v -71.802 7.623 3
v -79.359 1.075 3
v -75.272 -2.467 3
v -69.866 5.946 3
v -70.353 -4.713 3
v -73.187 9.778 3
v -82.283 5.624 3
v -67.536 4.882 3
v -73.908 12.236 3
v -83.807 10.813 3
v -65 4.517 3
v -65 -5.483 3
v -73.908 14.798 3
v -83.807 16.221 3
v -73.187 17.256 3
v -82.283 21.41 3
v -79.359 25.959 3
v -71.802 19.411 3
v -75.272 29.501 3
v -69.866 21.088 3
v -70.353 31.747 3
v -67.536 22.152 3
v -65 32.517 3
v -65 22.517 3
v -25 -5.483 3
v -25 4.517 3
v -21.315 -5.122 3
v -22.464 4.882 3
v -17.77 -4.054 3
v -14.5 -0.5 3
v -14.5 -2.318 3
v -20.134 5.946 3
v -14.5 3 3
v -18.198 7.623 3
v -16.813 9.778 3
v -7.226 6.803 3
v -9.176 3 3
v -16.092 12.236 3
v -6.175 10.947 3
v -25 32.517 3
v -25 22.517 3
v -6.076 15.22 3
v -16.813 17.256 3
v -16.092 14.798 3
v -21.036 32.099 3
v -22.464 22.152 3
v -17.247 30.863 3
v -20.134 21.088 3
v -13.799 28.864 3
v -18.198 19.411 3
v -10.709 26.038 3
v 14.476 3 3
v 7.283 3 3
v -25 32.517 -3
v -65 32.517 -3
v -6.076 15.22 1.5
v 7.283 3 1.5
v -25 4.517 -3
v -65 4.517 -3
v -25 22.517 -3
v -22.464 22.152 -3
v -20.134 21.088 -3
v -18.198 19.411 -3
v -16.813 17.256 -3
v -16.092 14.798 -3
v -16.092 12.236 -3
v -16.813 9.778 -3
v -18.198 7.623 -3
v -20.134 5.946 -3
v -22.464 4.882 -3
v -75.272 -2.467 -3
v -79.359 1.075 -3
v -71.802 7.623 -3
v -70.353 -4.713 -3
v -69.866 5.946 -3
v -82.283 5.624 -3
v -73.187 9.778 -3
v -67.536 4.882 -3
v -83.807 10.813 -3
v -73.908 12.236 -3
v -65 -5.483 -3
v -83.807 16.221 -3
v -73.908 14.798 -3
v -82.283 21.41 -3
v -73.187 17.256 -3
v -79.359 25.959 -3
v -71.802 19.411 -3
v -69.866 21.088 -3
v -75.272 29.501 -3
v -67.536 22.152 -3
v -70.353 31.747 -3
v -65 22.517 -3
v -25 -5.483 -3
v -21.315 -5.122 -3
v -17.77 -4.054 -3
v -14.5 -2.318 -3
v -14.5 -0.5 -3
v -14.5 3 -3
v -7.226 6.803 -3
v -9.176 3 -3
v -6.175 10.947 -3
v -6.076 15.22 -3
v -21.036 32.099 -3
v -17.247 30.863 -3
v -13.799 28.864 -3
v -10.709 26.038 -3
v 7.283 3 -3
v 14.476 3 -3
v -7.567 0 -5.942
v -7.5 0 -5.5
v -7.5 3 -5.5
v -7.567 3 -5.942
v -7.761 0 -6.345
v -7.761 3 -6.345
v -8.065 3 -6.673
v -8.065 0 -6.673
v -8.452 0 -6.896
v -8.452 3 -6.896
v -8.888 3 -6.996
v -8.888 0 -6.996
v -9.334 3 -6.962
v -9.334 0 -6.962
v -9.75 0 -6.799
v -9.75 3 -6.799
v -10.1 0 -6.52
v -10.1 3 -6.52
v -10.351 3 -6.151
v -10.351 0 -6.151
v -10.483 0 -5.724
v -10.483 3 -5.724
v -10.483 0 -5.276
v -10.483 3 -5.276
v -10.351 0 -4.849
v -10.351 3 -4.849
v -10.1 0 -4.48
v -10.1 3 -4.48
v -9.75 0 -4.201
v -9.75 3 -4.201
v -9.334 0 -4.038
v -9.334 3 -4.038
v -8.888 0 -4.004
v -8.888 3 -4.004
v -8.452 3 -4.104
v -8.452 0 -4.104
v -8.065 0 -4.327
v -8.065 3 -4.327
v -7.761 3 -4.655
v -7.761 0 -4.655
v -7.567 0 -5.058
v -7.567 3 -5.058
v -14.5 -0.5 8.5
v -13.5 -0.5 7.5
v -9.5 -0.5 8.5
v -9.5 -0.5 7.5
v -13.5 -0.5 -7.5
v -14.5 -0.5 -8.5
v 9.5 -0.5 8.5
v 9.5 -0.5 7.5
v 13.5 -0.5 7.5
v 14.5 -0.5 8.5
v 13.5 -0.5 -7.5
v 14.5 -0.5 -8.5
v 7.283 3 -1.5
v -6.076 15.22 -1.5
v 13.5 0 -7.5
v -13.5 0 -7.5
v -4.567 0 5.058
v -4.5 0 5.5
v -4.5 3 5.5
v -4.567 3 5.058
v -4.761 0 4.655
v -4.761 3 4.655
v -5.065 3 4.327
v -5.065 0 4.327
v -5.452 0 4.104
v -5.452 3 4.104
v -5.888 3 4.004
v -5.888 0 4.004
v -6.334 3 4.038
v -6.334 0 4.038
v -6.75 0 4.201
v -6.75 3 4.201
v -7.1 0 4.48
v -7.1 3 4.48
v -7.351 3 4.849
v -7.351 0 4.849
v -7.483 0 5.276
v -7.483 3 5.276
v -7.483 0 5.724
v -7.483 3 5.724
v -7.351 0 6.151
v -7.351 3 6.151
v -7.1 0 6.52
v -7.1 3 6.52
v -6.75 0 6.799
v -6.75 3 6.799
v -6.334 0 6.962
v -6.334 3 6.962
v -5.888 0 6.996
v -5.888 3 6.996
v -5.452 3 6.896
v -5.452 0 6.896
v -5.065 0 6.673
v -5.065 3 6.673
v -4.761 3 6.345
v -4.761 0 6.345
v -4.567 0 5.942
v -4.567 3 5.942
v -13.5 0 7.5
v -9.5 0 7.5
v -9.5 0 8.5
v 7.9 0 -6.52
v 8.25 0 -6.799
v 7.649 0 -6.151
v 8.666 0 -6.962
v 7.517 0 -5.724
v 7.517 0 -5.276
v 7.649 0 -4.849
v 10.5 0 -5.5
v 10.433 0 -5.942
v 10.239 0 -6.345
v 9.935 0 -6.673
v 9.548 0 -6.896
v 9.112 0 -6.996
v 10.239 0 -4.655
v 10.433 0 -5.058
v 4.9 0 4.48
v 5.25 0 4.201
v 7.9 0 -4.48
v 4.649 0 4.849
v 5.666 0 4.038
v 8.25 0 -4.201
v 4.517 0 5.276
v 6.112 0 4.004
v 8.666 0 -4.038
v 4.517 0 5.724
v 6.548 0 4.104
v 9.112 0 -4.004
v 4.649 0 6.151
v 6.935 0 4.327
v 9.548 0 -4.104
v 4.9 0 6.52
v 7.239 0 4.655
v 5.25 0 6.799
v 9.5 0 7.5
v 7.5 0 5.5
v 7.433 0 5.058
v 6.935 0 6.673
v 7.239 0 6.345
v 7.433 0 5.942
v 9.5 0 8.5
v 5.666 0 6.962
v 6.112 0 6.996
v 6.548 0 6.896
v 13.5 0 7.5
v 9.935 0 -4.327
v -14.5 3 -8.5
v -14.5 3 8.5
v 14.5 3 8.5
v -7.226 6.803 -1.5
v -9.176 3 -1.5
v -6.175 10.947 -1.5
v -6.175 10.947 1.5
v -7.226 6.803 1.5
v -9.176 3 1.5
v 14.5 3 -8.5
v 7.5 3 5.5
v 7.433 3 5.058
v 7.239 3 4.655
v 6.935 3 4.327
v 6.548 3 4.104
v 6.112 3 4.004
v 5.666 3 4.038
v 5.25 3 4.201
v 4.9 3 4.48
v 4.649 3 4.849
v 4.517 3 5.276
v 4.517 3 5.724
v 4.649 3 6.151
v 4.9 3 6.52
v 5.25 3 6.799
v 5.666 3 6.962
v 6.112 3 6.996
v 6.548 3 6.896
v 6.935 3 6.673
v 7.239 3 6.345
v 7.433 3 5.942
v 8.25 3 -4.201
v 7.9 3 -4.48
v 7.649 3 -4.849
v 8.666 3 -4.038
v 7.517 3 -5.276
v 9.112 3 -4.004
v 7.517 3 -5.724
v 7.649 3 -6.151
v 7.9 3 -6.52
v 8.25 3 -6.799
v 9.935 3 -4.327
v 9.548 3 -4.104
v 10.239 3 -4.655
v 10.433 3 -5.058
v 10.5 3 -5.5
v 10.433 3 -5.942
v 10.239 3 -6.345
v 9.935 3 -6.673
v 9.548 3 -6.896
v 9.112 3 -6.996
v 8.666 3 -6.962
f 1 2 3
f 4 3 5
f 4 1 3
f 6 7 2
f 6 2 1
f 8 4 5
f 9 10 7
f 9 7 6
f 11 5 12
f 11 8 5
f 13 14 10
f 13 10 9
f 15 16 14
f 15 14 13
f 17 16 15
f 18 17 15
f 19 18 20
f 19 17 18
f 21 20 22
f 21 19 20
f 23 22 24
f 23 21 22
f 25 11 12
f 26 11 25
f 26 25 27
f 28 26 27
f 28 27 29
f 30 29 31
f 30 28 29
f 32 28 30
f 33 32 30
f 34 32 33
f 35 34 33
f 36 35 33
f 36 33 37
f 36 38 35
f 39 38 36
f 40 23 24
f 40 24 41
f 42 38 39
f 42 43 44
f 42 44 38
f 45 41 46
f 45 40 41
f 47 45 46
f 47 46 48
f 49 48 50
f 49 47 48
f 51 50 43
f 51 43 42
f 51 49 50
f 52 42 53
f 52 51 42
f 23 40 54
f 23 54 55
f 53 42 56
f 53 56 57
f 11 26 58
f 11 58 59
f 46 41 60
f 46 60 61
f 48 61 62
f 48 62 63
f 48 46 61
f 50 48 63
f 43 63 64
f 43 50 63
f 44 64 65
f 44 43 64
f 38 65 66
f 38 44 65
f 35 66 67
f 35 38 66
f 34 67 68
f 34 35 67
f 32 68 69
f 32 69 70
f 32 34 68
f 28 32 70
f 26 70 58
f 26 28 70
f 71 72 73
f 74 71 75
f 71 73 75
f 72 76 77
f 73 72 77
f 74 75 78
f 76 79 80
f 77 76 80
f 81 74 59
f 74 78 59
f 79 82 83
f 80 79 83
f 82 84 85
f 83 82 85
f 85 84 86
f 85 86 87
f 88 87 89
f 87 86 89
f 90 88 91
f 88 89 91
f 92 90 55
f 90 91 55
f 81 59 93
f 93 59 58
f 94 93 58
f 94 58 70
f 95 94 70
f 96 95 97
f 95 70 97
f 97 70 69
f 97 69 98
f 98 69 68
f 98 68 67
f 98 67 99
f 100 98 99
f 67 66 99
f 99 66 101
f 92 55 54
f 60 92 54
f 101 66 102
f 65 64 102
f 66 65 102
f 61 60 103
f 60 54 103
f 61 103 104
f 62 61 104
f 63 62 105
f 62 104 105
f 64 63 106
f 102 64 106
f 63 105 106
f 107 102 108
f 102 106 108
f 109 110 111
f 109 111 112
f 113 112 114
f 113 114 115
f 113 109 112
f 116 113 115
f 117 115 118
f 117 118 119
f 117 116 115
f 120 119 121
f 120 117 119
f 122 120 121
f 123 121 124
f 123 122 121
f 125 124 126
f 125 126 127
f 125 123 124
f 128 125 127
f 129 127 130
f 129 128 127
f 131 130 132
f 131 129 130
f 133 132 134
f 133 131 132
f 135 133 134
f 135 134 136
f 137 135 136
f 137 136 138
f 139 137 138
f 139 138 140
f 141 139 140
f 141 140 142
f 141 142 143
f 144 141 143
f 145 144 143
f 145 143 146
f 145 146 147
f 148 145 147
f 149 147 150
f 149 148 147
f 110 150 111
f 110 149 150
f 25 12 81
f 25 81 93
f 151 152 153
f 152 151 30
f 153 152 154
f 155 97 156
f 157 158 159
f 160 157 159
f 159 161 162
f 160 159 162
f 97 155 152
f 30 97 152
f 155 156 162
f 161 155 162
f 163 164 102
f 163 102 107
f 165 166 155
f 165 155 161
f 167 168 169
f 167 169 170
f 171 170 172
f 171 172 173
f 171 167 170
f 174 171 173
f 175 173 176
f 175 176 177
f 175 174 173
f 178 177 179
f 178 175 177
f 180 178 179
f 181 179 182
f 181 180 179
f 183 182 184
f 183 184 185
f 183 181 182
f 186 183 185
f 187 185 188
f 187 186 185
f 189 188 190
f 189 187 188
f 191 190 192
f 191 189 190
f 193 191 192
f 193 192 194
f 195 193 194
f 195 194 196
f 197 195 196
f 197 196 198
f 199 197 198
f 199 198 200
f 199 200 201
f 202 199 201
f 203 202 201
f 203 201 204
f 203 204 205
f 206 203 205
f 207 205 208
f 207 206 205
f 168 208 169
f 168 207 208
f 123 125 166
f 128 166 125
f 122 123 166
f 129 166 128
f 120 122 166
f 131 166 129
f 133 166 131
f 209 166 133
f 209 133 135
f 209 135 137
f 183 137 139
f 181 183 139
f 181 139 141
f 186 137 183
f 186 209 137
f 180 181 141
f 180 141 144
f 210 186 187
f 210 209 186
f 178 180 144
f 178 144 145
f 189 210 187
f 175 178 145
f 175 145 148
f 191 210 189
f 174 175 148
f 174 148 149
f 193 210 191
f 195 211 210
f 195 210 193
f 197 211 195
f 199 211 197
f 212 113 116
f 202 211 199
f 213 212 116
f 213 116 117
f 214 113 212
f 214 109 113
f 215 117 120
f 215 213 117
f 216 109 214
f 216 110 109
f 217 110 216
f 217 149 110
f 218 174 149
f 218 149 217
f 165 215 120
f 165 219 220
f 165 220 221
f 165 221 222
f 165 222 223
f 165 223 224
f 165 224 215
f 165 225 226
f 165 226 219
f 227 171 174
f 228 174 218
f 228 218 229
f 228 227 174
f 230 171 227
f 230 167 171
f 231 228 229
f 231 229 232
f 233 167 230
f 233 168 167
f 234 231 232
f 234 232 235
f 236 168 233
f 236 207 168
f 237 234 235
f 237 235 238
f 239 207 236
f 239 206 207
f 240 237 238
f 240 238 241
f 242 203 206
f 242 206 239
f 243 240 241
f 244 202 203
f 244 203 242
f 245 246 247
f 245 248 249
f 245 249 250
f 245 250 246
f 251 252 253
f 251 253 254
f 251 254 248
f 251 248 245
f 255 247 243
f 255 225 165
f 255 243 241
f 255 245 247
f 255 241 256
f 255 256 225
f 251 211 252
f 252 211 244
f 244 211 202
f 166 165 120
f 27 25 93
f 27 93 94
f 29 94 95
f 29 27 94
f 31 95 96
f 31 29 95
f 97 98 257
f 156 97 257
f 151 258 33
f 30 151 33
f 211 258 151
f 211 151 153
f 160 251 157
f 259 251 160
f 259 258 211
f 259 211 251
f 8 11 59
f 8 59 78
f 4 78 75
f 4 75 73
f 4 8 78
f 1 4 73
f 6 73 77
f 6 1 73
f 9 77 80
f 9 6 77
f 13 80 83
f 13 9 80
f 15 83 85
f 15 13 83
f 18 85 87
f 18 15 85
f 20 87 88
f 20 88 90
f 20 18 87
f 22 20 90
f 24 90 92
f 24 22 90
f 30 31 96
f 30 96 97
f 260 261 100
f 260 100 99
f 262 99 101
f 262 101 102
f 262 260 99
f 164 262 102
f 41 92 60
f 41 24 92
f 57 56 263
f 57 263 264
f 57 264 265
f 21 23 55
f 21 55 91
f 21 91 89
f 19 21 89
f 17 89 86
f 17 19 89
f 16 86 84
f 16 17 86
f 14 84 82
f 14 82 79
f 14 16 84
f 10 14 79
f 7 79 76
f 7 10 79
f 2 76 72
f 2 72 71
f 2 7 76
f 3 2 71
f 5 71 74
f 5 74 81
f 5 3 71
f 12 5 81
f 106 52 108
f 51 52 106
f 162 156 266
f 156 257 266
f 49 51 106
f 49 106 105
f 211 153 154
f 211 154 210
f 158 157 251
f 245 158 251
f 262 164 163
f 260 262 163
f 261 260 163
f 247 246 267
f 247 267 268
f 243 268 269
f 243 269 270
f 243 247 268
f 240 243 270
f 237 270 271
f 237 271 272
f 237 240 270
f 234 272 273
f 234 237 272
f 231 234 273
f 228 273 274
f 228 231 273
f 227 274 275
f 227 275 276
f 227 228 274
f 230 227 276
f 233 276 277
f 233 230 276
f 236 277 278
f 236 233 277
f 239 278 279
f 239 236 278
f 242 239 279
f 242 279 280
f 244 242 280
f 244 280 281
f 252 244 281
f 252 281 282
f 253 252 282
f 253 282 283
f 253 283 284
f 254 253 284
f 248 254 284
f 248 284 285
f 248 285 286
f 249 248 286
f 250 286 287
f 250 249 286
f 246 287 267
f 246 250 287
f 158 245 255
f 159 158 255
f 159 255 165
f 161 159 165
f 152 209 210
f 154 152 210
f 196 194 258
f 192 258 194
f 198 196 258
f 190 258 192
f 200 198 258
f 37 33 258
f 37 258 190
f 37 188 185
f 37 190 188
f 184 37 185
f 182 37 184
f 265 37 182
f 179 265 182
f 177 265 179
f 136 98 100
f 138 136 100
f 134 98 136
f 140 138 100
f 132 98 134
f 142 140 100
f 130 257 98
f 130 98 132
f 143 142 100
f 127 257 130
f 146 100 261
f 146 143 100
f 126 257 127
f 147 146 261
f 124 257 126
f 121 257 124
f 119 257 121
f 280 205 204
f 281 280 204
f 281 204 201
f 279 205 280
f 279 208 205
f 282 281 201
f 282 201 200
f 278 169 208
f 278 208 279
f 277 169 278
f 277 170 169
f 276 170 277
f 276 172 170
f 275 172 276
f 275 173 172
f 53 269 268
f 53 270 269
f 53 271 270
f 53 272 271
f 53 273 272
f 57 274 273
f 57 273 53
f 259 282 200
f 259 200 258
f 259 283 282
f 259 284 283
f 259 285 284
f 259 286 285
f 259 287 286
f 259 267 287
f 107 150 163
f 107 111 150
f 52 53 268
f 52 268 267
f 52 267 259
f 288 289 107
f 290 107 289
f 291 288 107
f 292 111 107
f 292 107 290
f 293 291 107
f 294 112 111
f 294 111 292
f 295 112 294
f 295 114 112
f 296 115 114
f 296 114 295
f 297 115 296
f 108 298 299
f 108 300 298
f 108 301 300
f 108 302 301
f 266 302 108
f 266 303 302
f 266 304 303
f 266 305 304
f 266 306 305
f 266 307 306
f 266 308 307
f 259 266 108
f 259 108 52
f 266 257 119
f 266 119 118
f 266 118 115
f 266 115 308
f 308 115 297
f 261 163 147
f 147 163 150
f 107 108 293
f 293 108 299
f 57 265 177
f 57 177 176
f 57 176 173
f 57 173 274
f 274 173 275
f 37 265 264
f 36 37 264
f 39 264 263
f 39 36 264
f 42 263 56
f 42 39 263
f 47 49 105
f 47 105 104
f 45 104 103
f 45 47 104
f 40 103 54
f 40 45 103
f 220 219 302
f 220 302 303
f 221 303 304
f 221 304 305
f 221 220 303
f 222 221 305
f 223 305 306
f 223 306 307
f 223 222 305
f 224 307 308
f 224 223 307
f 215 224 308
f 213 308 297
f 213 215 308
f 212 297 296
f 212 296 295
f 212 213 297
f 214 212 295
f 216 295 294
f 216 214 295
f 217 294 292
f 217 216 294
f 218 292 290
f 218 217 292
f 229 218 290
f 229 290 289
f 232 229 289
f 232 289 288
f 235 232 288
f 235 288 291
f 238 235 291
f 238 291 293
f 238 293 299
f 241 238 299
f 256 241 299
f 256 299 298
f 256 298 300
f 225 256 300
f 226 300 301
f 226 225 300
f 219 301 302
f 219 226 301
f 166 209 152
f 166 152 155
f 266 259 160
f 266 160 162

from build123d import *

# Parameters (mm, degrees)
SKETCH1_W           = 29
SKETCH1_H           = 17
SKETCH1_R           = 1.5
BOSS_EXTRUDE1_DEPTH = 3
SKETCH1_3_W         = 29
SKETCH1_3_H         = 17
SKETCH1_3_W_2       = 27
SKETCH1_3_H_2       = 15
BOSS_EXTRUDE2_DEPTH = 0.5
SKETCH3_W           = 19
SKETCH3_H           = 1
CUT_EXTRUDE1_DEPTH  = 6
BOSS_EXTRUDE3_DEPTH = 3
BOSS_EXTRUDE4_DEPTH = 1.5


with BuildPart() as part:
    # Sketch1 → Boss-Extrude1 (new body)
    with BuildSketch(Plane(origin=(0, 0, 0), x_dir=(1, 0, 0), z_dir=(0, 1, 0))):
        Rectangle(SKETCH1_W, SKETCH1_H)
        with Locations((-6, -5.5)):
            Circle(SKETCH1_R, mode=Mode.SUBTRACT)
        with Locations((6, -5.5)):
            Circle(SKETCH1_R, mode=Mode.SUBTRACT)
        with Locations((-9, 5.5)):
            Circle(SKETCH1_R, mode=Mode.SUBTRACT)
        with Locations((9, 5.5)):
            Circle(SKETCH1_R, mode=Mode.SUBTRACT)
    extrude(amount=BOSS_EXTRUDE1_DEPTH)

    # Sketch1<3> → Boss-Extrude2 (add)
    with BuildSketch(Plane(origin=(0, 0, 0), x_dir=(1, 0, 0), z_dir=(0, 1, 0))):
        Rectangle(SKETCH1_3_W, SKETCH1_3_H)
        Rectangle(SKETCH1_3_W_2, SKETCH1_3_H_2, mode=Mode.SUBTRACT)
    extrude(amount=-BOSS_EXTRUDE2_DEPTH)

    # Sketch3 → Cut-Extrude1 (cut)
    with BuildSketch(Plane.XY.offset(8.5)):
        with Locations((0, -0.5)):
            Rectangle(SKETCH3_W, SKETCH3_H)
    extrude(amount=-CUT_EXTRUDE1_DEPTH, mode=Mode.SUBTRACT)

    # Sketch4 → Boss-Extrude3 (add, symmetric)
    with BuildSketch(Plane.XY):
        with BuildLine():
            Line((-65, -5.482953492), (-25, -5.482953492))
            ThreePointArc((-25, -5.482953492), (-19.516691912, -4.674526607), (-14.5, -2.318041114))
            Line((-14.5, -2.318041114), (-14.5, 3))
            Line((-14.5, 3), (-9.176228871, 3))
            ThreePointArc((-9.176228871, 3), (-6.583274937, 8.845404617), (-6.076469935, 15.219988049))
            Line((-6.076469935, 15.219988049), (7.282732748, 3))
            Line((7.282732748, 3), (14.476431663, 3))
            Line((14.476431663, 3), (-13.79929628, 28.864496986))
            ThreePointArc((-13.79929628, 28.864496986), (-19.109395578, 31.580843992), (-25, 32.517046508))
            Line((-25, 32.517046508), (-65, 32.517046508))
            ThreePointArc((-65, 32.517046508), (-84, 13.517046508), (-65, -5.482953492))
        make_face()
        with BuildLine():
            ThreePointArc((-25, 22.517046508), (-16, 13.517046508), (-25, 4.517046508))
            Line((-25, 4.517046508), (-65, 4.517046508))
            ThreePointArc((-65, 4.517046508), (-74, 13.517046508), (-65, 22.517046508))
            Line((-65, 22.517046508), (-25, 22.517046508))
        make_face(mode=Mode.SUBTRACT)
    extrude(amount=BOSS_EXTRUDE3_DEPTH, both=True)

    # Sketch4<3> → Boss-Extrude4 (add, symmetric)
    with BuildSketch(Plane.XY):
        with BuildLine():
            ThreePointArc((-6.076469935, 15.219988049), (-6.583274937, 8.845404617), (-9.176228871, 3))
            Line((-9.176228871, 3), (7.282732748, 3))
            Line((7.282732748, 3), (-6.076469935, 15.219988049))
        make_face()
    extrude(amount=BOSS_EXTRUDE4_DEPTH, both=True)


solid = part.part
